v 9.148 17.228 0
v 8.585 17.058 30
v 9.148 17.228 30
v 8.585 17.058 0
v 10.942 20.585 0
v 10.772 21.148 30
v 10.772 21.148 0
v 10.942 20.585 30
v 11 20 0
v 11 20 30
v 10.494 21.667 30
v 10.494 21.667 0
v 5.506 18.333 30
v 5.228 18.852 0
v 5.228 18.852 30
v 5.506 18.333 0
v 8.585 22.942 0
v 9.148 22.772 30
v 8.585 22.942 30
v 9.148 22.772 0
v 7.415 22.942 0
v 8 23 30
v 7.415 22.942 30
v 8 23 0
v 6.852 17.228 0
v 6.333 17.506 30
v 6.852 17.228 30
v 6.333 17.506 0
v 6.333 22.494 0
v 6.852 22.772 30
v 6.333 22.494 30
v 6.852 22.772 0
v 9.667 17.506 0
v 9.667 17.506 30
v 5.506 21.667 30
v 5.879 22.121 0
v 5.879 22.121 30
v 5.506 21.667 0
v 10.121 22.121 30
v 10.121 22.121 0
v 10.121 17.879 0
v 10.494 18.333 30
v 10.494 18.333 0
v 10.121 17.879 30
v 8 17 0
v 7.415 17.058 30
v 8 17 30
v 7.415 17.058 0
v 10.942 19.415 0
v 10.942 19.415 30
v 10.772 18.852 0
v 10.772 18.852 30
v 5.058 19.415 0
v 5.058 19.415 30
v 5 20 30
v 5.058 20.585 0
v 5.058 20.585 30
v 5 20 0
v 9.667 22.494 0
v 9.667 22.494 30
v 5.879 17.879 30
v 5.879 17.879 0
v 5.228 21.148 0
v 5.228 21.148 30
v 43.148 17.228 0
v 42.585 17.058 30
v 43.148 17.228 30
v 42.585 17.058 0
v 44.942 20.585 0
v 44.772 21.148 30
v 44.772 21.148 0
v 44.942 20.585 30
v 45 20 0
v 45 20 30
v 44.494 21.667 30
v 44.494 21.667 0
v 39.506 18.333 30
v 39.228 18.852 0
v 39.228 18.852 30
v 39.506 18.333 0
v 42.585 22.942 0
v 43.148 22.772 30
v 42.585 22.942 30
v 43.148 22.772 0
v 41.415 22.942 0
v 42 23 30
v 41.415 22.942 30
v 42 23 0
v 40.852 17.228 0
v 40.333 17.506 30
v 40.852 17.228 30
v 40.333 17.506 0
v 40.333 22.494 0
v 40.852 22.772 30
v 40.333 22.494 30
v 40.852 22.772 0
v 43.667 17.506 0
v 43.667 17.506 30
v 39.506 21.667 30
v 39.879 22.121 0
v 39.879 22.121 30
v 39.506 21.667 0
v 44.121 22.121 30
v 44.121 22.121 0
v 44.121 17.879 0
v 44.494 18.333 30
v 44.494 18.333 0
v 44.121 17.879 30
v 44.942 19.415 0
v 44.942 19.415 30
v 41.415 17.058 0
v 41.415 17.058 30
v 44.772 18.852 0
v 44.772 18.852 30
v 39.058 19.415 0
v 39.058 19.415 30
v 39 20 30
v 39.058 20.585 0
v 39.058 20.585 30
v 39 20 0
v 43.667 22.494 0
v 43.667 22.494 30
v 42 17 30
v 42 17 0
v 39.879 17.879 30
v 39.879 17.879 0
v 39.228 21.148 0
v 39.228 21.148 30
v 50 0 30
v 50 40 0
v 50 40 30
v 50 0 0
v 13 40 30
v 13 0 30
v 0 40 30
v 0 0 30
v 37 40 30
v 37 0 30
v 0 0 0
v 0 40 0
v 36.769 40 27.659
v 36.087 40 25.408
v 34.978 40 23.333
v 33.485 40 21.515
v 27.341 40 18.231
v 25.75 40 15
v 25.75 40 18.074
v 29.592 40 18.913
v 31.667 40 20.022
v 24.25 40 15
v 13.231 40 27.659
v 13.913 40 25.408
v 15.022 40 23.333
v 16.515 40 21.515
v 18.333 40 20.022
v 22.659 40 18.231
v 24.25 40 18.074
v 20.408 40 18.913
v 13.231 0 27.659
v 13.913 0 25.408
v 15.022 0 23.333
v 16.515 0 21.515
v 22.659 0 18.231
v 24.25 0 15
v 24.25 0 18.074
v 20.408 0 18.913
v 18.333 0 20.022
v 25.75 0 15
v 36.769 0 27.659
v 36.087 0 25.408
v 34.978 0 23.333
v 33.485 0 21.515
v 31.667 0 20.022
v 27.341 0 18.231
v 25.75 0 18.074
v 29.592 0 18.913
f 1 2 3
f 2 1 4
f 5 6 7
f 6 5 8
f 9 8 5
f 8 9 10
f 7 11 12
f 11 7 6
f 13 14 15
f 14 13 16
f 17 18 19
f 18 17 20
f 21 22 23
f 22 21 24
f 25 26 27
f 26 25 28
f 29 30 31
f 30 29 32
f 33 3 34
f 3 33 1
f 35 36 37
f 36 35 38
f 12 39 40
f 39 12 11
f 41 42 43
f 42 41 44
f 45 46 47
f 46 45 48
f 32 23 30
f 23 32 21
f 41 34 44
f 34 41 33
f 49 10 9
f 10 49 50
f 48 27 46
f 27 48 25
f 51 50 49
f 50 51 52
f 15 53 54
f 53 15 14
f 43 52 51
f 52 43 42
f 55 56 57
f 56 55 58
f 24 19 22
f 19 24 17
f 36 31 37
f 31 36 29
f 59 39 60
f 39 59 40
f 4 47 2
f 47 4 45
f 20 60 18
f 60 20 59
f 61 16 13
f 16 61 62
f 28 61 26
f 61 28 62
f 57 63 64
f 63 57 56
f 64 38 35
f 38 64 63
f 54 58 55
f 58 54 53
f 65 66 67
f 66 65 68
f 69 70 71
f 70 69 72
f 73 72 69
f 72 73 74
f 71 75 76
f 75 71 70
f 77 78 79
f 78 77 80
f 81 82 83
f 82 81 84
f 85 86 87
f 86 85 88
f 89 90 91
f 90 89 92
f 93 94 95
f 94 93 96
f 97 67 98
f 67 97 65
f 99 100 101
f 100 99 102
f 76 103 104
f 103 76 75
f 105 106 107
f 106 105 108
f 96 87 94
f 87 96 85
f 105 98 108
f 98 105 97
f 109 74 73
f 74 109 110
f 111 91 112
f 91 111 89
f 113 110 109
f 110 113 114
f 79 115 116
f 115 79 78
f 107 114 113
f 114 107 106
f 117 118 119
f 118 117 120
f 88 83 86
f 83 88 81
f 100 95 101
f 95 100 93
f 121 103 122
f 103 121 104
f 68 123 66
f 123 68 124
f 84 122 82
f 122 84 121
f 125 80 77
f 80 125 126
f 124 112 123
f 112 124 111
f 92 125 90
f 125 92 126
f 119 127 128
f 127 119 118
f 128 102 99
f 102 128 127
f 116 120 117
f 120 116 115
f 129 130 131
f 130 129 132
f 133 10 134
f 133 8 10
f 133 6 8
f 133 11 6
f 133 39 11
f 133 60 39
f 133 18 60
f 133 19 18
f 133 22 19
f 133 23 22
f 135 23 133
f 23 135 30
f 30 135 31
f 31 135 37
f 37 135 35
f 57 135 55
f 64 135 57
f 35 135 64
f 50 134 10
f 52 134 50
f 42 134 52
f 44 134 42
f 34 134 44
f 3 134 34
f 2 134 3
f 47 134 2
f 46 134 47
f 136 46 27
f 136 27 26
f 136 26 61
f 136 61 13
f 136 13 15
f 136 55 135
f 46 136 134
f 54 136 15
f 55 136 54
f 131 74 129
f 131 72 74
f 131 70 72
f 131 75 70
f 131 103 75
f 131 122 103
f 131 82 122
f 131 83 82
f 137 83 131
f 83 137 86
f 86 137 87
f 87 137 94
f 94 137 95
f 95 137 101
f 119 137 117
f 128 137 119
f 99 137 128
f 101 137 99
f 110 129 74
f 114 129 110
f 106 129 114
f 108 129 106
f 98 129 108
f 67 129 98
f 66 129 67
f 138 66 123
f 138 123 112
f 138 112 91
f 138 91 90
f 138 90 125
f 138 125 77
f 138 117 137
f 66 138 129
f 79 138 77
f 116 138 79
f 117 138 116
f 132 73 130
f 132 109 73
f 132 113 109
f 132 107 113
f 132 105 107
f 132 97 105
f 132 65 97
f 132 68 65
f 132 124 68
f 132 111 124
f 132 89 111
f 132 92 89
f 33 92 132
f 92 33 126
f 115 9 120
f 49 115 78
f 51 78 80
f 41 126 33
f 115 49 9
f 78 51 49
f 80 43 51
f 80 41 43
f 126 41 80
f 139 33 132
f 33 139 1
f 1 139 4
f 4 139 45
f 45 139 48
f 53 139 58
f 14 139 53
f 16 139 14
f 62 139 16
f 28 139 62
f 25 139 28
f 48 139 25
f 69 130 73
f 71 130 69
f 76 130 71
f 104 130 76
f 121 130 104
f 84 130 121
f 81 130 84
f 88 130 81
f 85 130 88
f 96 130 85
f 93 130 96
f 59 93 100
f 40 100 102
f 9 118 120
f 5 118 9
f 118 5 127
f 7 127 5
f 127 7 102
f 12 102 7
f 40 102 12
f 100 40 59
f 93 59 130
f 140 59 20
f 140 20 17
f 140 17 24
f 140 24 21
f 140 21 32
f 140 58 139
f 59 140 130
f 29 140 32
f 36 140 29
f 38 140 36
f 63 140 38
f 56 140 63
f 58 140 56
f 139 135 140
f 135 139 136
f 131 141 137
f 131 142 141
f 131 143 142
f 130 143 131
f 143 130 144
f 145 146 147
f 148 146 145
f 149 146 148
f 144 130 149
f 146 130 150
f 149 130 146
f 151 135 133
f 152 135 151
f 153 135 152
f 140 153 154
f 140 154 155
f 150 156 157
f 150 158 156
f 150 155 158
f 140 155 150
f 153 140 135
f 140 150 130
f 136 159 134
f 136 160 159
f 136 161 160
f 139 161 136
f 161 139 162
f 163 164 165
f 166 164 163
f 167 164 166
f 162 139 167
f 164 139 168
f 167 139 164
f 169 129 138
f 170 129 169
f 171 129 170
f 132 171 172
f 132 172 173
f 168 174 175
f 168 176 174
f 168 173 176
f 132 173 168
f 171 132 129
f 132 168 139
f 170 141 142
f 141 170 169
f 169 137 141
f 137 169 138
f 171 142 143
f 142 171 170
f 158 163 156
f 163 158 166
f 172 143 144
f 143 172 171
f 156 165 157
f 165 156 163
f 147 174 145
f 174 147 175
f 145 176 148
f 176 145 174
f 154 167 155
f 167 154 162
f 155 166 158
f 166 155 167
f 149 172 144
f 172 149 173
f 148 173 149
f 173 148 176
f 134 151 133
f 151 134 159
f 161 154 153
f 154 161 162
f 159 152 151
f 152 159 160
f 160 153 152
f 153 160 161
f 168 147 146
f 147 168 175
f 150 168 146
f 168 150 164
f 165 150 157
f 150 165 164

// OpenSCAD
$fn = 32;

// ----------------------------------------------------------------------
// Saddle clamp: split shaft clamp
// ----------------------------------------------------------------------

// --- parameters (mm) ---
blk_l = 50;               // block length, X
blk_w = 40;               // block width, Y
blk_h = 30;               // block height
clamp_r = 12;             // shaft groove radius
hole_r = 3;               // bolt hole radius
hole_m = 8;               // bolt hole margin from the ends
saw_w = 1.5;              // saw kerf width

saw_depth = clamp_r + 3;  // saw kerf depth

difference() {
  cube([blk_l, blk_w, blk_h]);
  translate([blk_l / 2, -1, blk_h])
    rotate([-90, 0, 0])
      cylinder(h = blk_w + 2, r = clamp_r);
  for (sx = [0, 1])
    translate([sx ? blk_l - hole_m : hole_m, blk_w / 2, -1])
      cylinder(r = hole_r, h = blk_h + 2);
  translate([blk_l / 2 - saw_w / 2, -1, blk_h - saw_depth])
    cube([saw_w, blk_w + 2, saw_depth + 1]);
}
